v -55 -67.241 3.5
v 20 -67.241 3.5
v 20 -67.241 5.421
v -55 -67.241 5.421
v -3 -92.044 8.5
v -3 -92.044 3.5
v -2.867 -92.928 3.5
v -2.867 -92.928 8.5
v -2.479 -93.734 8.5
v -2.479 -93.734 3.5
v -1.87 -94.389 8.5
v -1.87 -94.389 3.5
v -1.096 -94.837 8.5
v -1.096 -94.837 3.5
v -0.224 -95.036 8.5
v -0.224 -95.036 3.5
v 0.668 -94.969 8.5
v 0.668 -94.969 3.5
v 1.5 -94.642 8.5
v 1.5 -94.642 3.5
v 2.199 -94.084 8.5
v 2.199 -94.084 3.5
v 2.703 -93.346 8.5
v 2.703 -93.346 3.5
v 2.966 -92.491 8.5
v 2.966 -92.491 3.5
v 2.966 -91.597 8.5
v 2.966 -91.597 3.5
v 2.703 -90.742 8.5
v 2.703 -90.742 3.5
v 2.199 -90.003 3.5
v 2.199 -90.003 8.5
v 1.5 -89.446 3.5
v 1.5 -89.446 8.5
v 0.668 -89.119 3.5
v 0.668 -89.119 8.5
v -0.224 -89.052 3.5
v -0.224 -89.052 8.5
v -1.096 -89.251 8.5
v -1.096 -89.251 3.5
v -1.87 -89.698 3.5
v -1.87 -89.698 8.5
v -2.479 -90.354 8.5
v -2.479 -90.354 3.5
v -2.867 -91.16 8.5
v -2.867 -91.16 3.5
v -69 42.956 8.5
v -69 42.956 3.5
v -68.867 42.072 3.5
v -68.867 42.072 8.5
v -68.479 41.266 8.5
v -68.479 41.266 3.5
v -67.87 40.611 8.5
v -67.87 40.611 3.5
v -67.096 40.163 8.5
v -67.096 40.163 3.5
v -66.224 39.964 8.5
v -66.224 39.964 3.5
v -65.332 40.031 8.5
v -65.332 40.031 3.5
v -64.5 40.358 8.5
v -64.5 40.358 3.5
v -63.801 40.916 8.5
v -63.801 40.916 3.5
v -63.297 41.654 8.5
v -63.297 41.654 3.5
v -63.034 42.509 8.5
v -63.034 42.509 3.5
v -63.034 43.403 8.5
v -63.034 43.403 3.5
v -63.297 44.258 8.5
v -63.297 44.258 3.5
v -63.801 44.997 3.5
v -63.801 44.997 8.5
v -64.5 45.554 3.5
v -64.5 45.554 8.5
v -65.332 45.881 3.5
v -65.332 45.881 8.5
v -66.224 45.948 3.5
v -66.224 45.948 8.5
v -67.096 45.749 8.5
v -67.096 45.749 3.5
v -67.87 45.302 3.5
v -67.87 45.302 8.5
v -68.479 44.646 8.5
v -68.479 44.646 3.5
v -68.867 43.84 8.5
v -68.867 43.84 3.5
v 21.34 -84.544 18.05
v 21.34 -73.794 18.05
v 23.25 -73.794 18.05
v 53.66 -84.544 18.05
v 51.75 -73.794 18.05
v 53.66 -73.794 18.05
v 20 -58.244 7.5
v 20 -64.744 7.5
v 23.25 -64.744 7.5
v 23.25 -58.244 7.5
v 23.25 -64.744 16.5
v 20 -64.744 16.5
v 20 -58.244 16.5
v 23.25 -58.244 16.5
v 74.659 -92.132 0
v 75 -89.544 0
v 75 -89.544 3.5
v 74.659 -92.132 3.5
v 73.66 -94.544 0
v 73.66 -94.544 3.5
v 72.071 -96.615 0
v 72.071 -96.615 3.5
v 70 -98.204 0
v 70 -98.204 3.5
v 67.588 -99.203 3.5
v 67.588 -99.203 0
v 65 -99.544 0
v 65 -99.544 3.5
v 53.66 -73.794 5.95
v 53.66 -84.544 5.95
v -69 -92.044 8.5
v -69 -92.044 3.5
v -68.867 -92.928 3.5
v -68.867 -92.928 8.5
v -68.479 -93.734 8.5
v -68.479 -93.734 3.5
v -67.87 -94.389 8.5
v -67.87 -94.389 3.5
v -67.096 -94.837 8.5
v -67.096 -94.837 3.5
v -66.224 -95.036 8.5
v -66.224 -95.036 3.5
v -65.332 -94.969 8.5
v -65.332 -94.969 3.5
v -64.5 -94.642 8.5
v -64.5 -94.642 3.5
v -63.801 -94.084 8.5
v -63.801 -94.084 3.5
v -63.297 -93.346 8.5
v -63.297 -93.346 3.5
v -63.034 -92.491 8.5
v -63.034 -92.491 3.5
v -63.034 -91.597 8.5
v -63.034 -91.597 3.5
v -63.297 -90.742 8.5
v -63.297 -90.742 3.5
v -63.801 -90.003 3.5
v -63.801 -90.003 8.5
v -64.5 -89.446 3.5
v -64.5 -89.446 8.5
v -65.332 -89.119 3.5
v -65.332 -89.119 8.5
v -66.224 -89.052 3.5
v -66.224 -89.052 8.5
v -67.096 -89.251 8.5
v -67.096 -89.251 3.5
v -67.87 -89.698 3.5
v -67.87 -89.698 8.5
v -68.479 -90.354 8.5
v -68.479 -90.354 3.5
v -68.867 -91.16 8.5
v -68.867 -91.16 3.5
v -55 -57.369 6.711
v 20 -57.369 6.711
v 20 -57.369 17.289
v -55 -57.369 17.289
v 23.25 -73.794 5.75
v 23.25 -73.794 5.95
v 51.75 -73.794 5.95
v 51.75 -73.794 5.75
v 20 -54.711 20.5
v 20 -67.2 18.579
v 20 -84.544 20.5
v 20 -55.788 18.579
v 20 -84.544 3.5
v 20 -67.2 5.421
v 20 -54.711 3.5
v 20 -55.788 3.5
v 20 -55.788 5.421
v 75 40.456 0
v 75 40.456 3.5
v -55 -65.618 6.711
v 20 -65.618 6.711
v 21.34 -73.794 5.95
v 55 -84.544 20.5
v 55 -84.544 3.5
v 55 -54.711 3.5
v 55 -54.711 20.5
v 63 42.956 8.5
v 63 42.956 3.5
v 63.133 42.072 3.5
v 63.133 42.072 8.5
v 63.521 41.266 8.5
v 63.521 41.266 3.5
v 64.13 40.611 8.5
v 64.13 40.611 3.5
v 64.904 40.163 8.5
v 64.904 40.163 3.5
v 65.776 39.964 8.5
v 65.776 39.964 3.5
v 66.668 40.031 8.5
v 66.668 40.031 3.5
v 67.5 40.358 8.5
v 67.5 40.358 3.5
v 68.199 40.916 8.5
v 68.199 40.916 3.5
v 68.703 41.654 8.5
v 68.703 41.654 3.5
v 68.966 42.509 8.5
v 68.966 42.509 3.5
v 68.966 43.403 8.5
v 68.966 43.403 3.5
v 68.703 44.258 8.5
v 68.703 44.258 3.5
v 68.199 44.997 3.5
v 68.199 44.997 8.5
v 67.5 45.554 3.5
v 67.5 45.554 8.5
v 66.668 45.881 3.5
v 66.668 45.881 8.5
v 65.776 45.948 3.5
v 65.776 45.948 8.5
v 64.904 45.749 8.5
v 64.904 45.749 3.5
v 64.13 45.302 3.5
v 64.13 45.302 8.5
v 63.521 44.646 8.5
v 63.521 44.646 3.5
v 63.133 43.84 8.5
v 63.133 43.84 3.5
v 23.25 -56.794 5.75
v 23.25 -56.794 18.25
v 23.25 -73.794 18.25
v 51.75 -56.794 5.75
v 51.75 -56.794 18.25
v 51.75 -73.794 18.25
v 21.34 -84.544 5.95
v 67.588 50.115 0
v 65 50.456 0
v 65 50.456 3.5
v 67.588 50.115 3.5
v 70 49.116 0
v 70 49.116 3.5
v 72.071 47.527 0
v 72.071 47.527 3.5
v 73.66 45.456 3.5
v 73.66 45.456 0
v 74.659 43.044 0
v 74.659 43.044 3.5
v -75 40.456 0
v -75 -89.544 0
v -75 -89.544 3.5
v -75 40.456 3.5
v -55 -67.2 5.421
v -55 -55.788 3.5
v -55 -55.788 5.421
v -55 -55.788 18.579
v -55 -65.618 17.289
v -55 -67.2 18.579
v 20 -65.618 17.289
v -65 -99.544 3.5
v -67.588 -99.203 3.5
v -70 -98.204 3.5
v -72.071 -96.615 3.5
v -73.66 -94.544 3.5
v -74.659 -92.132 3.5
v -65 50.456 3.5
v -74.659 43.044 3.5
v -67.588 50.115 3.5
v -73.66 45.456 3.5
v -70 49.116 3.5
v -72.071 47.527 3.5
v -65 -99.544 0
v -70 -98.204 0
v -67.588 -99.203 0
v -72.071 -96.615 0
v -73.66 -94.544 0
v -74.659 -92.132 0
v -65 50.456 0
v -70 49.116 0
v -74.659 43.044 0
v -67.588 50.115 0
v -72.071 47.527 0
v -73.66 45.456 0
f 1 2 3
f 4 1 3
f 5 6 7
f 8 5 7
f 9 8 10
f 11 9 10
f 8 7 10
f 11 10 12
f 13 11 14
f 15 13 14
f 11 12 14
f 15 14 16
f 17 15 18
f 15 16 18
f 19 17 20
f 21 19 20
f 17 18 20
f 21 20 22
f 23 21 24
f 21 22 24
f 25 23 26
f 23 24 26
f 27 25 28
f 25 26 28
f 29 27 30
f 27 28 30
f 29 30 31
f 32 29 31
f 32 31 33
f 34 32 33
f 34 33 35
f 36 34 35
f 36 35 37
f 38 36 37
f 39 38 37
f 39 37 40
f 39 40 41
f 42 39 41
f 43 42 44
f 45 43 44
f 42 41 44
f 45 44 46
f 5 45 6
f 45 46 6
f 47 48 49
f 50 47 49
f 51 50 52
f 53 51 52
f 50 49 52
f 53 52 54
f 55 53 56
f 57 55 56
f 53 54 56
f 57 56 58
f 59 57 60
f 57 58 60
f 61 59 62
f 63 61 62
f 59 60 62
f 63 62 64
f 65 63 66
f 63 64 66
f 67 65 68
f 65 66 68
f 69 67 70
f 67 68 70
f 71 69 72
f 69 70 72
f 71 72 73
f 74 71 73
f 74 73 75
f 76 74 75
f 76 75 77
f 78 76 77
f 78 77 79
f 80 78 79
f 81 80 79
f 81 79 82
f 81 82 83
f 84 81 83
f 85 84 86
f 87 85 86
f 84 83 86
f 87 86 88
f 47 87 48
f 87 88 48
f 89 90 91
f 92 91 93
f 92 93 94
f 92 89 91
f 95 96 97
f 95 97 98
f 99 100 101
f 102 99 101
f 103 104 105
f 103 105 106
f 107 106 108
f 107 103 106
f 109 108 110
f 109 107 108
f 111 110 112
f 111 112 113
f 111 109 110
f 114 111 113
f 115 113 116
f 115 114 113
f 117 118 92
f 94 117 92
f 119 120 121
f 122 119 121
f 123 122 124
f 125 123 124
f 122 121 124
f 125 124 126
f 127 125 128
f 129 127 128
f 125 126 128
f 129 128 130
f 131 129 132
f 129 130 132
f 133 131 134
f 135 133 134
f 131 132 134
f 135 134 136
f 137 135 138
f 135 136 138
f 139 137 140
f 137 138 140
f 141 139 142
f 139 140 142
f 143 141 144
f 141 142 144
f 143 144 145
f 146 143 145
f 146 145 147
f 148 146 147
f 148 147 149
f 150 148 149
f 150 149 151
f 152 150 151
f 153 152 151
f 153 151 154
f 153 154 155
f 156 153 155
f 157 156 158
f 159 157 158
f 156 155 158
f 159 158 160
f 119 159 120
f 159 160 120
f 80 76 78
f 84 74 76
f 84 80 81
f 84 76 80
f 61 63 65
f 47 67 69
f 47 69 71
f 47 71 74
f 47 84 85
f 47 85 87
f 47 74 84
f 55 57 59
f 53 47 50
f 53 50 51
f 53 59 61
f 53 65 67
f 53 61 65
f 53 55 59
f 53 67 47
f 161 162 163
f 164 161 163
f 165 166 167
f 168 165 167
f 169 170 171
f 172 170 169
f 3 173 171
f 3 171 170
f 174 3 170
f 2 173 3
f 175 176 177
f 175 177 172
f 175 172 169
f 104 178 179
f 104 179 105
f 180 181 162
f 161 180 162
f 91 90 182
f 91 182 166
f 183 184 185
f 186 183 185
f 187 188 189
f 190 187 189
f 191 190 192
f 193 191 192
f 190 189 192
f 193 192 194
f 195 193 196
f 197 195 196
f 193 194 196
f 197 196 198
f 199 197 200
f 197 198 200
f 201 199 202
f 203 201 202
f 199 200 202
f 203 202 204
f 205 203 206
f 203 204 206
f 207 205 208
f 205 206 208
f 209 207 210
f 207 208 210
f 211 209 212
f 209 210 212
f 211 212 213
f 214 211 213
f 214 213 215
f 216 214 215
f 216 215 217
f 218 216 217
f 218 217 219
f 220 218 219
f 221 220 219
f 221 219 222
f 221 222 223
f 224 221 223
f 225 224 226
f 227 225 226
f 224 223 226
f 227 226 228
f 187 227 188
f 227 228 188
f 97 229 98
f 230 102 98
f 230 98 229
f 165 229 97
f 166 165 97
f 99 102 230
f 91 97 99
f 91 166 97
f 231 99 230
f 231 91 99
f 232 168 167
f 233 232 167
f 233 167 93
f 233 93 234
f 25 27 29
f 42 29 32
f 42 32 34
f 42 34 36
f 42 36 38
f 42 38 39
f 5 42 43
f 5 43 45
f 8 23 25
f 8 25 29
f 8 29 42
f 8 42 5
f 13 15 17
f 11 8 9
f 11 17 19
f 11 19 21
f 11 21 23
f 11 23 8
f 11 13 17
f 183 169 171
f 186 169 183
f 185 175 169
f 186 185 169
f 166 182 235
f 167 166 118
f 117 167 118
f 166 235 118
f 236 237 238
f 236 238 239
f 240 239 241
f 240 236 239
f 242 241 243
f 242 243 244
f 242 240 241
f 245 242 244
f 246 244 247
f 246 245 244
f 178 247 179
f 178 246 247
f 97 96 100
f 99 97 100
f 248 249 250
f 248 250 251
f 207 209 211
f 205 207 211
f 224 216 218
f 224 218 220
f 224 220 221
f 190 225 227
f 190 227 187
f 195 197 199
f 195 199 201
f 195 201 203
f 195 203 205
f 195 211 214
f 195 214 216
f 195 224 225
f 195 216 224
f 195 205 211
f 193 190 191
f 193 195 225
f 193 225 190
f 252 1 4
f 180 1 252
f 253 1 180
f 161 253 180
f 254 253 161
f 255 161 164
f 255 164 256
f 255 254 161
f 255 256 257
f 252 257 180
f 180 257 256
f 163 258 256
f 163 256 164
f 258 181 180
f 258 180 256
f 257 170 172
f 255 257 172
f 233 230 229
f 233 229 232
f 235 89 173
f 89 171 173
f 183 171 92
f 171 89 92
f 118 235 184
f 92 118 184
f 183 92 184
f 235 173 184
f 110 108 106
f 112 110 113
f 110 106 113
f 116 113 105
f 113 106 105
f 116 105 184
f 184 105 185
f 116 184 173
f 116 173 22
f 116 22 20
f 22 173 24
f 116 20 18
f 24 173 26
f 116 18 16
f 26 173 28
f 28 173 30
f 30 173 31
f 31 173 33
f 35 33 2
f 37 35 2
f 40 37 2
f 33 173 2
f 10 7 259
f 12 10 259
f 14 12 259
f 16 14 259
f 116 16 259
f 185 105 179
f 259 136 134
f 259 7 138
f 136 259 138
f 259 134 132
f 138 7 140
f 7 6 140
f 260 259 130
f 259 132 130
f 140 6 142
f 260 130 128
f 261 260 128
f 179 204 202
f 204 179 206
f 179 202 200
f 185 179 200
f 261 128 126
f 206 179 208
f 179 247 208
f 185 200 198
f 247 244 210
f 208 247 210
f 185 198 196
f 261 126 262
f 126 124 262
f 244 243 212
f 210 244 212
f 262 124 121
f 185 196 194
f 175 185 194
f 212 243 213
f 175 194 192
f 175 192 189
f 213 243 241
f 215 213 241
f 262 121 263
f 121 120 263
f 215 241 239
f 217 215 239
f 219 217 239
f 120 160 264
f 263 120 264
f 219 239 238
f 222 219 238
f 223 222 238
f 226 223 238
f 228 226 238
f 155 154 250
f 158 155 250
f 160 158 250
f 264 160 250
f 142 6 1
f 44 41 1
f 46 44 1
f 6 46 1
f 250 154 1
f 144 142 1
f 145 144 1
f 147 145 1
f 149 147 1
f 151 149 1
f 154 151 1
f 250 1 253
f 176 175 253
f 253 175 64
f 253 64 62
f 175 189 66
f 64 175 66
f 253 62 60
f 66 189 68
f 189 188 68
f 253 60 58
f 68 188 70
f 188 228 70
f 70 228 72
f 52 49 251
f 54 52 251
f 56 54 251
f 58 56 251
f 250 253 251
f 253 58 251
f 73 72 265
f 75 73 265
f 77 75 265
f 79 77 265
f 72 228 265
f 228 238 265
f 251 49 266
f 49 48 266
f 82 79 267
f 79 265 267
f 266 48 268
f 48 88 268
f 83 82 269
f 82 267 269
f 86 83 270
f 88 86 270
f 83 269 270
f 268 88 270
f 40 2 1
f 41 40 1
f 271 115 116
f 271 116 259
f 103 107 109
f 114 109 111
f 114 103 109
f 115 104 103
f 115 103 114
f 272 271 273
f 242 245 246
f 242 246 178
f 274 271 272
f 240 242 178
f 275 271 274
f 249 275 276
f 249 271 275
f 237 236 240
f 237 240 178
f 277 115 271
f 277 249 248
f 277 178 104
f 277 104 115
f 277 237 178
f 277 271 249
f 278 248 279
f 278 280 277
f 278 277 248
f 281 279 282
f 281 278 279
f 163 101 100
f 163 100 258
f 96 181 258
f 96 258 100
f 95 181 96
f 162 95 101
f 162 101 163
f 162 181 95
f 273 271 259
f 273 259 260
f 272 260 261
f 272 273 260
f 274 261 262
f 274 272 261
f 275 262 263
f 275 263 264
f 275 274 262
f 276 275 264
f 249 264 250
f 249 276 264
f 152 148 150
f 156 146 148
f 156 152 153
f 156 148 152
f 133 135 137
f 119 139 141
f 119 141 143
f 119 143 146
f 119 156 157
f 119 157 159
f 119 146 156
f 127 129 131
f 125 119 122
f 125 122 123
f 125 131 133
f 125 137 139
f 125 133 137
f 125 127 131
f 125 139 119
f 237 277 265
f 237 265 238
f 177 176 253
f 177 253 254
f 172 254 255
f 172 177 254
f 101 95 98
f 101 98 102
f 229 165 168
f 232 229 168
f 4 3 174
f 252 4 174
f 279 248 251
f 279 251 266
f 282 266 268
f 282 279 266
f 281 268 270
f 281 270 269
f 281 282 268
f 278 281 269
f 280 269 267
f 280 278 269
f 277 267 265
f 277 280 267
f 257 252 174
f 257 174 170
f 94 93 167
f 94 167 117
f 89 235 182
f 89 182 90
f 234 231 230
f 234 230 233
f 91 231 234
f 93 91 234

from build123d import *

# Parameters (mm, degrees)
BOSS_EXTRUDE1_DEPTH  = 3.5
SKETCH3_W            = 35
SKETCH3_H            = 40
BOSS_EXTRUDE2_DEPTH  = 17
SKETCH5_W            = 32.32
SKETCH5_H            = 12.1
CUT_EXTRUDE1_DEPTH   = 10.75
SKETCH6_W            = 28.5
SKETCH6_H            = 12.5
CUT_EXTRUDE2_DEPTH   = 17
SKETCH10_R           = 3
BOSS_EXTRUDE7_DEPTH  = 5
SKETCH11_R           = 3
BOSS_EXTRUDE8_DEPTH  = 5
SKETCH12_W           = 9
SKETCH12_H           = 6.5
CUT_EXTRUDE3_DEPTH   = 20
SKETCH13_W           = 17
SKETCH13_H           = 6.985272442
CUT_EXTRUDE4_DEPTH   = 140.119509628
SKETCH14_W           = 17
SKETCH14_H           = 3.182225524
CUT_EXTRUDE5_DEPTH   = 140.119509628
SKETCH15_W           = 13.15864123
SKETCH15_H           = 11.411738648
SKETCH15_W_2         = 10.578454188
SKETCH15_H_2         = 8.248928726
BOSS_EXTRUDE9_DEPTH  = 75
SKETCH16_W           = 1.920679385
SKETCH16_H           = 11.453083587
BOSS_EXTRUDE10_DEPTH = 75


with BuildPart() as part:
    # Sketch2 → Boss-Extrude1 (new body)
    with BuildSketch(Plane.XY):
        with BuildLine():
            Line((65, -99.543899658), (-65, -99.543899658))
            ThreePointArc((-65, -99.543899658), (-72.071067812, -96.61496747), (-75, -89.543899658))
            Line((-75, -89.543899658), (-75, 40.456100342))
            ThreePointArc((-75, 40.456100342), (-72.071067812, 47.527168154), (-65, 50.456100342))
            Line((-65, 50.456100342), (65, 50.456100342))
            ThreePointArc((65, 50.456100342), (72.071067812, 47.527168154), (75, 40.456100342))
            Line((75, 40.456100342), (75, -89.543899658))
            ThreePointArc((75, -89.543899658), (72.071067812, -96.61496747), (65, -99.543899658))
        make_face()
    extrude(amount=BOSS_EXTRUDE1_DEPTH)

    # Sketch3 → Boss-Extrude2 (add)
    with BuildSketch(Plane.XY.offset(3.5)):
        with Locations((37.5, -64.543899658)):
            Rectangle(SKETCH3_W, SKETCH3_H)
    extrude(amount=BOSS_EXTRUDE2_DEPTH)

    # Sketch5 → Cut-Extrude1 (cut)
    with BuildSketch(Plane.XZ.offset(84.543899658)):
        with Locations((37.5, 12)):
            Rectangle(SKETCH5_W, SKETCH5_H)
    extrude(amount=-CUT_EXTRUDE1_DEPTH, mode=Mode.SUBTRACT)

    # Sketch6 → Cut-Extrude2 (cut)
    with BuildSketch(Plane.XZ.offset(73.793899658)):
        with Locations((37.5, 12)):
            Rectangle(SKETCH6_W, SKETCH6_H)
    extrude(amount=-CUT_EXTRUDE2_DEPTH, mode=Mode.SUBTRACT)

    # Sketch10 → Boss-Extrude7 (add)
    with BuildSketch(Plane.XY.offset(3.5)):
        with Locations((0, -92.043899658)):
            Circle(SKETCH10_R)
        with Locations((-66, -92.043899658)):
            Circle(SKETCH10_R)
    extrude(amount=BOSS_EXTRUDE7_DEPTH)

    # Sketch11 → Boss-Extrude8 (add)
    with BuildSketch(Plane.XY.offset(3.5)):
        with Locations((-66, 42.956100342)):
            Circle(SKETCH11_R)
        with Locations((66, 42.956100342)):
            Circle(SKETCH11_R)
    extrude(amount=BOSS_EXTRUDE8_DEPTH)

    # Sketch12 → Cut-Extrude3 (cut)
    with BuildSketch(Plane.ZY.offset(-20)):
        with Locations((12, -61.493899658)):
            Rectangle(SKETCH12_W, SKETCH12_H)
    extrude(amount=-CUT_EXTRUDE3_DEPTH, mode=Mode.SUBTRACT)

    # Sketch13 → Cut-Extrude4 (cut, through all)
    with BuildSketch(Plane.ZY.offset(-20)):
        with Locations((12, -48.036535879)):
            Rectangle(SKETCH13_W, SKETCH13_H)
    extrude(amount=-CUT_EXTRUDE4_DEPTH, mode=Mode.SUBTRACT)

    # Sketch14 → Cut-Extrude5 (cut, through all)
    with BuildSketch(Plane.ZY.offset(-20)):
        with Locations((12, -53.120284862)):
            Rectangle(SKETCH14_W, SKETCH14_H)
    extrude(amount=-CUT_EXTRUDE5_DEPTH, mode=Mode.SUBTRACT)

    # Sketch15 → Boss-Extrude9 (add)
    with BuildSketch(Plane.ZY.offset(-20)):
        with Locations((12, -61.493899658)):
            Rectangle(SKETCH15_W, SKETCH15_H)
        with Locations((12, -61.493899658)):
            Rectangle(SKETCH15_W_2, SKETCH15_H_2, mode=Mode.SUBTRACT)
    extrude(amount=BOSS_EXTRUDE9_DEPTH)

    # Sketch16 → Boss-Extrude10 (add)
    with BuildSketch(Plane.ZY.offset(-20)):
        with Locations((4.460339692, -61.514572128)):
            Rectangle(SKETCH16_W, SKETCH16_H)
    extrude(amount=BOSS_EXTRUDE10_DEPTH)


solid = part.part
